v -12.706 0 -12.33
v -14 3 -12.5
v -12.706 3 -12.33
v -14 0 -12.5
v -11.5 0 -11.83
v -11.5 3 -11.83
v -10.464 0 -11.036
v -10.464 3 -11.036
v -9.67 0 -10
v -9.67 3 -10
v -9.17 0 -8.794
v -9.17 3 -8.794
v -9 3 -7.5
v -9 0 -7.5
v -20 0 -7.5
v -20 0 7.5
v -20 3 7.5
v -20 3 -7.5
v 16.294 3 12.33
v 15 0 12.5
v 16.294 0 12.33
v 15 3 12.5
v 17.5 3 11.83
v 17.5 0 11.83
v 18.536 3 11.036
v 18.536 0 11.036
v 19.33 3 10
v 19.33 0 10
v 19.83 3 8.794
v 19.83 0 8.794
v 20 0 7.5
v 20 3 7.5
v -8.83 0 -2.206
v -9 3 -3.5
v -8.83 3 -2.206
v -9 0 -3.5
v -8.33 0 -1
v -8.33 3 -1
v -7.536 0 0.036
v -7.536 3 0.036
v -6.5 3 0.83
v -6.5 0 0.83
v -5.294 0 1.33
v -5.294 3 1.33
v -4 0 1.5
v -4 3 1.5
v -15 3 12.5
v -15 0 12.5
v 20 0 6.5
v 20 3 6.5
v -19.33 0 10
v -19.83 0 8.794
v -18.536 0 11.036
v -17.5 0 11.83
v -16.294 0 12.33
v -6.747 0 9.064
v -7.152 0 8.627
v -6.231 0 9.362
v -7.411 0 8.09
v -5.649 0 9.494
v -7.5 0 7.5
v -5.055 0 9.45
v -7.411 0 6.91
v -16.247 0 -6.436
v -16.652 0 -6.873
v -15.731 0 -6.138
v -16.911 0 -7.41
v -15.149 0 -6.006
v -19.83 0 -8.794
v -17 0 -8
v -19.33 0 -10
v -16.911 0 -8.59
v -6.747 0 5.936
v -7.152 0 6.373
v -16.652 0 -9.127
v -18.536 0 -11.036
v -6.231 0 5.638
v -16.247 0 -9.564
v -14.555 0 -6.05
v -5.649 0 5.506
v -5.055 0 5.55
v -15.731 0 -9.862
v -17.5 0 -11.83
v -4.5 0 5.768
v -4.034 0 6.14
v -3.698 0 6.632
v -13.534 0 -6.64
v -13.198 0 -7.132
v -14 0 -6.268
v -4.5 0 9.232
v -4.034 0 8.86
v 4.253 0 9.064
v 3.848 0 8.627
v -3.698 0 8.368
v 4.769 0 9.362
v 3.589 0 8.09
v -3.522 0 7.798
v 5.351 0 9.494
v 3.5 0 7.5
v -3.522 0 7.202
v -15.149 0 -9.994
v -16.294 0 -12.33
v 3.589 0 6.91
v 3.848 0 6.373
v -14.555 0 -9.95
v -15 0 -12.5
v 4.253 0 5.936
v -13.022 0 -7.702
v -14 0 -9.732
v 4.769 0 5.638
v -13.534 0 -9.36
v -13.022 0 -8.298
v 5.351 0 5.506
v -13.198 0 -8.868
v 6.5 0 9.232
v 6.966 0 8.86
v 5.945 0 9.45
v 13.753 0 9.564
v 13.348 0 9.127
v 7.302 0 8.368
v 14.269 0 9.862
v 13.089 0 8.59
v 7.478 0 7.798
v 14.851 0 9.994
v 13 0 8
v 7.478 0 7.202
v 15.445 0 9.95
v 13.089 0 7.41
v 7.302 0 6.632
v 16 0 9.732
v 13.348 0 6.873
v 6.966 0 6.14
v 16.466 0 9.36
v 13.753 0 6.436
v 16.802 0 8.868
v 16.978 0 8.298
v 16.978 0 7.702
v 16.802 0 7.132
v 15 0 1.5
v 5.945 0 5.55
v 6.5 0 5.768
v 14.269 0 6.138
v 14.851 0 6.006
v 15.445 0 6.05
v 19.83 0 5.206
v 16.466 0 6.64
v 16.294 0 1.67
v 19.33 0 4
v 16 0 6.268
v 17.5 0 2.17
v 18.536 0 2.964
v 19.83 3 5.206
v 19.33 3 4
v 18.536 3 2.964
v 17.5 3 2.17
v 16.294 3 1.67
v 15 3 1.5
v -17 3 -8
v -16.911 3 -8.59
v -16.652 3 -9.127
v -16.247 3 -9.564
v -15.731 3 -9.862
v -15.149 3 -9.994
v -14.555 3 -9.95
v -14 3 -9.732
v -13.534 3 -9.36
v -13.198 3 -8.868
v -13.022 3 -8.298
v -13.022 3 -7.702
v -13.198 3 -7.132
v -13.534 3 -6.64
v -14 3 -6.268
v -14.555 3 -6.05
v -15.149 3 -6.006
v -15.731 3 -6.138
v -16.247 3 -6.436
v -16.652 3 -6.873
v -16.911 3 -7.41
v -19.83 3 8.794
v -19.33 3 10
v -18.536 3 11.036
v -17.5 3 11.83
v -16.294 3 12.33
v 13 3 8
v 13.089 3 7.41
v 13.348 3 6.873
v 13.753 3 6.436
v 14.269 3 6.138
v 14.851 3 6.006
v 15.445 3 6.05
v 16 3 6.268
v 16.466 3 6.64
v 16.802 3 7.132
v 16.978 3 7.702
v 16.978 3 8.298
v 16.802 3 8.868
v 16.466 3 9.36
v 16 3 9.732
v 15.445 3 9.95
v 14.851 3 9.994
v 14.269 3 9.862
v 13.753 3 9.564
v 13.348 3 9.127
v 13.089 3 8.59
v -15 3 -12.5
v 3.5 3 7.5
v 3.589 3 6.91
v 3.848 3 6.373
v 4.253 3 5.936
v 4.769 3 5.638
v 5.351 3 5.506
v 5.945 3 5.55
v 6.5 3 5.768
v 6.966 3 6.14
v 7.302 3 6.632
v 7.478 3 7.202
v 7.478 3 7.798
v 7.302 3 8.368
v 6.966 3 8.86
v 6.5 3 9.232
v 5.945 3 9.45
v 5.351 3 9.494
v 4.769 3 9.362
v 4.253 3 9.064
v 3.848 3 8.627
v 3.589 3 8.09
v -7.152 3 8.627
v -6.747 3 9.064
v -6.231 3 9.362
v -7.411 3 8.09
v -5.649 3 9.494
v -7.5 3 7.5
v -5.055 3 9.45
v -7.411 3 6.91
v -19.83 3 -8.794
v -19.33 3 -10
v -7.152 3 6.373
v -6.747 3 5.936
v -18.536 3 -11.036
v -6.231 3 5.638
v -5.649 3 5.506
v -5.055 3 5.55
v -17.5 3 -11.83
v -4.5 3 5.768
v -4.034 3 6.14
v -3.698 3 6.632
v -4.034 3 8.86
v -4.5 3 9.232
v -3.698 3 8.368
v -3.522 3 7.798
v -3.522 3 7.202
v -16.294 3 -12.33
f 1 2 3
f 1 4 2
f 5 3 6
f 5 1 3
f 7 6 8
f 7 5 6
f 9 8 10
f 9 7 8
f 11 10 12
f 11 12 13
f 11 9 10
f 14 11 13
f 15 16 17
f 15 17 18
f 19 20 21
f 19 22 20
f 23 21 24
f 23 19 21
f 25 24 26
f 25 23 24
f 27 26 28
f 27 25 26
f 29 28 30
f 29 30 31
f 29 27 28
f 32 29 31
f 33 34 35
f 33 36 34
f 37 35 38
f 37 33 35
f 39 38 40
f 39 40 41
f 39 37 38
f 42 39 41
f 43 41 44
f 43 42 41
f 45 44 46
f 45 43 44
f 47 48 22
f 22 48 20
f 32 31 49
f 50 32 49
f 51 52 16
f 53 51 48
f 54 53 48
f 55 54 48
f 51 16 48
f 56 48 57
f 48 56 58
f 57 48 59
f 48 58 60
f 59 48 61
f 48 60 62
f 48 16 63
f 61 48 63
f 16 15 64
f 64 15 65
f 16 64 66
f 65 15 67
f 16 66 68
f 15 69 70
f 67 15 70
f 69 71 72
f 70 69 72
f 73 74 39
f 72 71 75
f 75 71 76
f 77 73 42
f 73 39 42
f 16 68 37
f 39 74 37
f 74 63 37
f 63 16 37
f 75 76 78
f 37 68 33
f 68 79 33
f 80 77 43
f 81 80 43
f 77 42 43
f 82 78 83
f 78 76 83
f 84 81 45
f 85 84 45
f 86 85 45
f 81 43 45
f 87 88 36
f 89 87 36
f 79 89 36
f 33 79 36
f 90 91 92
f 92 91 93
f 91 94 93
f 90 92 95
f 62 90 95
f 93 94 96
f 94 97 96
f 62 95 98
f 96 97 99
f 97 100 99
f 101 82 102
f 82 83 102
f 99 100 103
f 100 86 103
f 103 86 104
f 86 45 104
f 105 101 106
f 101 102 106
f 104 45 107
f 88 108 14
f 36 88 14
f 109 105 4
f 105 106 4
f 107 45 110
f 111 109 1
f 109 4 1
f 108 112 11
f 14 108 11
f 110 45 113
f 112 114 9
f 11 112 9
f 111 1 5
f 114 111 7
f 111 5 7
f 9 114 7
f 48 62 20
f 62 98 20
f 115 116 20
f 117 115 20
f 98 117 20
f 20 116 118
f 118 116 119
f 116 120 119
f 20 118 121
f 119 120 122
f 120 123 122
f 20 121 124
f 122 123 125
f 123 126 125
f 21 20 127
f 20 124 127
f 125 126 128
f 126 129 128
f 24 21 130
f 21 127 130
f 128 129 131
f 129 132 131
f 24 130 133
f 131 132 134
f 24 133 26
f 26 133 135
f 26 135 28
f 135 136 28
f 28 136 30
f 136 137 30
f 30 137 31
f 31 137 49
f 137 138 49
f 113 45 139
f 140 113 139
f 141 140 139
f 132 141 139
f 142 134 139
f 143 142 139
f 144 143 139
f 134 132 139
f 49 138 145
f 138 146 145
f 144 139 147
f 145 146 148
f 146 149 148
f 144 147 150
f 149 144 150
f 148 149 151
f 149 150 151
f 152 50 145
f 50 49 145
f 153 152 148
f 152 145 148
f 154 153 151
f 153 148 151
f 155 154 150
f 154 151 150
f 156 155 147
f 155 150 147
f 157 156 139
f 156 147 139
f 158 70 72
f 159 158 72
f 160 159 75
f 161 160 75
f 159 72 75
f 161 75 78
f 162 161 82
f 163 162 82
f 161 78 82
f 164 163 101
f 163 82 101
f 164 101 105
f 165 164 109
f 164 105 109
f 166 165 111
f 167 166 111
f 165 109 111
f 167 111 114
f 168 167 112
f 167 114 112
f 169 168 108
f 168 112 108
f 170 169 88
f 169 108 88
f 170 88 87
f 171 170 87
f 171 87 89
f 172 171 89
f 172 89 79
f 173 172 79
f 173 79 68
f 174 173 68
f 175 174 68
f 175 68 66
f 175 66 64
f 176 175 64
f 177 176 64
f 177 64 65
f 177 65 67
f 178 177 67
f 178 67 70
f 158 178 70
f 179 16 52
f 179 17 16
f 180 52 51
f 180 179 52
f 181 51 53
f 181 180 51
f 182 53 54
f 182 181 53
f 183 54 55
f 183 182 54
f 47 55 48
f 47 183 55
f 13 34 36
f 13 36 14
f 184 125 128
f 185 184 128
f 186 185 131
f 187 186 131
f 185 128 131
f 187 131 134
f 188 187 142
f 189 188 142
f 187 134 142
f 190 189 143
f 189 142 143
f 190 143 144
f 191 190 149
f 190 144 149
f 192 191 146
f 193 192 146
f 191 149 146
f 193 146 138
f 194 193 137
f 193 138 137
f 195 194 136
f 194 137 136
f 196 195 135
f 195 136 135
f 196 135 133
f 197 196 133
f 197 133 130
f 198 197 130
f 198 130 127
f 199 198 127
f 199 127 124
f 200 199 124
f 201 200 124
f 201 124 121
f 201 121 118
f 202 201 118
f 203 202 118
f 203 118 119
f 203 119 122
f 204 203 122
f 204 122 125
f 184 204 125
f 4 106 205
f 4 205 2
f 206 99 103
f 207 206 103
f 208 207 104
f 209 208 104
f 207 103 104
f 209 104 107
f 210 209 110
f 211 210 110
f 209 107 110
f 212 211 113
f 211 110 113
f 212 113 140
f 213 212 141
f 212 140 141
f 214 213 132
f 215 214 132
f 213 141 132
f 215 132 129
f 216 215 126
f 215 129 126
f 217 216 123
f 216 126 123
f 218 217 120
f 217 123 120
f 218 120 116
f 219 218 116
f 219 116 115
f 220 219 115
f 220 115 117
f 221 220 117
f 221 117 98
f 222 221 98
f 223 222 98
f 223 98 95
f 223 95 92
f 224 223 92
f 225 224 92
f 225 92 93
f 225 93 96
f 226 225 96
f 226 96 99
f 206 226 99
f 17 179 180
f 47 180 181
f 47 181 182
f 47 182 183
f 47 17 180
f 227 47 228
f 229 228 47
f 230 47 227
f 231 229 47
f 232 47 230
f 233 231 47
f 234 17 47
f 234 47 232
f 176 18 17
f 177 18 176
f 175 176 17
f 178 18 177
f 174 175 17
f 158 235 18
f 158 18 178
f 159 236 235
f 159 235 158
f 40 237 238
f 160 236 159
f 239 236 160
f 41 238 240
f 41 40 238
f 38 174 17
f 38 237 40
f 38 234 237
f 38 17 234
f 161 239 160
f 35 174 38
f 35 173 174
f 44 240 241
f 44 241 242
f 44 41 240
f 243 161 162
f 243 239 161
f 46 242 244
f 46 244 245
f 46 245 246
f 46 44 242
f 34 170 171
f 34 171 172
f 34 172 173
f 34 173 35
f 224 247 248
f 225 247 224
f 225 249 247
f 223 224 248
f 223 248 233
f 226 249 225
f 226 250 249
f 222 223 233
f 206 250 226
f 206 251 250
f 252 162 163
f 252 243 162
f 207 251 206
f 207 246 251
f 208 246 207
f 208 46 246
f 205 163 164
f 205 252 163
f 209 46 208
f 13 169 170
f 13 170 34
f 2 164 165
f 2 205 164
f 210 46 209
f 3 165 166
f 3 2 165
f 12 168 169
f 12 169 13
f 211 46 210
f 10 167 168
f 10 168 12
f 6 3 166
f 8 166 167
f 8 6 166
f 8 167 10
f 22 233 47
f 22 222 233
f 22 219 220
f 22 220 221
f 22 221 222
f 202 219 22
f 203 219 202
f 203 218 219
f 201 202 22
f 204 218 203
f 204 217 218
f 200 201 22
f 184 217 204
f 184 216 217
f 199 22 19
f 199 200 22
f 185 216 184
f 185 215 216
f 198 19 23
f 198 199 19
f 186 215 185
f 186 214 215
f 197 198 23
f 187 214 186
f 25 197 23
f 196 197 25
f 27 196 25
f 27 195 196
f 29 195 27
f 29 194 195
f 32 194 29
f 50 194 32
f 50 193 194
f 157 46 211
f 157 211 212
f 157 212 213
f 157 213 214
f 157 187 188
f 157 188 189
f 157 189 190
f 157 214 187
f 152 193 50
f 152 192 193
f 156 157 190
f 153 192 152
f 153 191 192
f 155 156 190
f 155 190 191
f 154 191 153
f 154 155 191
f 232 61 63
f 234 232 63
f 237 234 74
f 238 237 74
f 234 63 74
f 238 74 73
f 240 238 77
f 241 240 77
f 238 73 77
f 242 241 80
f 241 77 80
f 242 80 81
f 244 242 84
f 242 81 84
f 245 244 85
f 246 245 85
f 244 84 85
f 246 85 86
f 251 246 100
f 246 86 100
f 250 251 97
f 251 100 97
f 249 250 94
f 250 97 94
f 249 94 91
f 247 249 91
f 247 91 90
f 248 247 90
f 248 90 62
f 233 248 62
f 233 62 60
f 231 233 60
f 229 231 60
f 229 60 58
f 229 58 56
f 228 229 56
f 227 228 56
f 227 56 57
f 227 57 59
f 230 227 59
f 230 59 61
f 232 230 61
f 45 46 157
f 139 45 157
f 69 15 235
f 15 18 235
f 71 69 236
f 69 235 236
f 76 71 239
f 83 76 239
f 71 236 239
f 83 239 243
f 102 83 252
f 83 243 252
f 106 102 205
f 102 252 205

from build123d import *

# Parameters (mm, degrees)
SKETCH1_W                = 40
SKETCH1_H                = 25
BOSS_EXTRUDE1_DEPTH      = 3
F_4_0_4_DIAMETER_HOLE1_D = 4
F_4_0_4_DIAMETER_HOLE2_D = 4
SKETCH10_W               = 29
SKETCH10_H               = 14
CUT_EXTRUDE2_DEPTH       = 3
FILLET2_R                = 5


with BuildPart() as part:
    # Sketch1 → Boss-Extrude1 (new body)
    with BuildSketch(Plane(origin=(0, 0, 0), x_dir=(1, 0, 0), z_dir=(0, 1, 0))):
        Rectangle(SKETCH1_W, SKETCH1_H)
    extrude(amount=BOSS_EXTRUDE1_DEPTH)

    # Ø4.0 (4) Diameter Hole1 (through all)
    with Locations(Plane(origin=(0, 3, 0), x_dir=(1, 0, 0), z_dir=(0, 1, 0))):
        with Locations((-15, 8), (15, -8)):
            Hole(F_4_0_4_DIAMETER_HOLE1_D / 2)

    # Ø4.0 (4) Diameter Hole2 (through all)
    with Locations(Plane(origin=(0, 3, 0), x_dir=(1, 0, 0), z_dir=(0, 1, 0))):
        with Locations((-5.5, -7.5), (5.5, -7.5)):
            Hole(F_4_0_4_DIAMETER_HOLE2_D / 2)

    # Sketch10 → Cut-Extrude2 (cut)
    with BuildSketch(Plane(origin=(0, 3, 0), x_dir=(1, 0, 0), z_dir=(0, 1, 0))):
        with Locations((5.5, 5.5)):
            Rectangle(SKETCH10_W, SKETCH10_H)
    extrude(amount=-CUT_EXTRUDE2_DEPTH, mode=Mode.SUBTRACT)

    # Fillet2
    fillet2_edges = [part.edges().sort_by_distance(p)[0] for p in [
        (-9, 1.5, -12.5),
        (20, 1.5, 1.5),
        (-9, 1.5, 1.5),
        (-20, 1.5, -12.5),
        (20, 1.5, 12.5),
        (-20, 1.5, 12.5),
    ]]
    fillet(fillet2_edges, radius=FILLET2_R)


solid = part.part
